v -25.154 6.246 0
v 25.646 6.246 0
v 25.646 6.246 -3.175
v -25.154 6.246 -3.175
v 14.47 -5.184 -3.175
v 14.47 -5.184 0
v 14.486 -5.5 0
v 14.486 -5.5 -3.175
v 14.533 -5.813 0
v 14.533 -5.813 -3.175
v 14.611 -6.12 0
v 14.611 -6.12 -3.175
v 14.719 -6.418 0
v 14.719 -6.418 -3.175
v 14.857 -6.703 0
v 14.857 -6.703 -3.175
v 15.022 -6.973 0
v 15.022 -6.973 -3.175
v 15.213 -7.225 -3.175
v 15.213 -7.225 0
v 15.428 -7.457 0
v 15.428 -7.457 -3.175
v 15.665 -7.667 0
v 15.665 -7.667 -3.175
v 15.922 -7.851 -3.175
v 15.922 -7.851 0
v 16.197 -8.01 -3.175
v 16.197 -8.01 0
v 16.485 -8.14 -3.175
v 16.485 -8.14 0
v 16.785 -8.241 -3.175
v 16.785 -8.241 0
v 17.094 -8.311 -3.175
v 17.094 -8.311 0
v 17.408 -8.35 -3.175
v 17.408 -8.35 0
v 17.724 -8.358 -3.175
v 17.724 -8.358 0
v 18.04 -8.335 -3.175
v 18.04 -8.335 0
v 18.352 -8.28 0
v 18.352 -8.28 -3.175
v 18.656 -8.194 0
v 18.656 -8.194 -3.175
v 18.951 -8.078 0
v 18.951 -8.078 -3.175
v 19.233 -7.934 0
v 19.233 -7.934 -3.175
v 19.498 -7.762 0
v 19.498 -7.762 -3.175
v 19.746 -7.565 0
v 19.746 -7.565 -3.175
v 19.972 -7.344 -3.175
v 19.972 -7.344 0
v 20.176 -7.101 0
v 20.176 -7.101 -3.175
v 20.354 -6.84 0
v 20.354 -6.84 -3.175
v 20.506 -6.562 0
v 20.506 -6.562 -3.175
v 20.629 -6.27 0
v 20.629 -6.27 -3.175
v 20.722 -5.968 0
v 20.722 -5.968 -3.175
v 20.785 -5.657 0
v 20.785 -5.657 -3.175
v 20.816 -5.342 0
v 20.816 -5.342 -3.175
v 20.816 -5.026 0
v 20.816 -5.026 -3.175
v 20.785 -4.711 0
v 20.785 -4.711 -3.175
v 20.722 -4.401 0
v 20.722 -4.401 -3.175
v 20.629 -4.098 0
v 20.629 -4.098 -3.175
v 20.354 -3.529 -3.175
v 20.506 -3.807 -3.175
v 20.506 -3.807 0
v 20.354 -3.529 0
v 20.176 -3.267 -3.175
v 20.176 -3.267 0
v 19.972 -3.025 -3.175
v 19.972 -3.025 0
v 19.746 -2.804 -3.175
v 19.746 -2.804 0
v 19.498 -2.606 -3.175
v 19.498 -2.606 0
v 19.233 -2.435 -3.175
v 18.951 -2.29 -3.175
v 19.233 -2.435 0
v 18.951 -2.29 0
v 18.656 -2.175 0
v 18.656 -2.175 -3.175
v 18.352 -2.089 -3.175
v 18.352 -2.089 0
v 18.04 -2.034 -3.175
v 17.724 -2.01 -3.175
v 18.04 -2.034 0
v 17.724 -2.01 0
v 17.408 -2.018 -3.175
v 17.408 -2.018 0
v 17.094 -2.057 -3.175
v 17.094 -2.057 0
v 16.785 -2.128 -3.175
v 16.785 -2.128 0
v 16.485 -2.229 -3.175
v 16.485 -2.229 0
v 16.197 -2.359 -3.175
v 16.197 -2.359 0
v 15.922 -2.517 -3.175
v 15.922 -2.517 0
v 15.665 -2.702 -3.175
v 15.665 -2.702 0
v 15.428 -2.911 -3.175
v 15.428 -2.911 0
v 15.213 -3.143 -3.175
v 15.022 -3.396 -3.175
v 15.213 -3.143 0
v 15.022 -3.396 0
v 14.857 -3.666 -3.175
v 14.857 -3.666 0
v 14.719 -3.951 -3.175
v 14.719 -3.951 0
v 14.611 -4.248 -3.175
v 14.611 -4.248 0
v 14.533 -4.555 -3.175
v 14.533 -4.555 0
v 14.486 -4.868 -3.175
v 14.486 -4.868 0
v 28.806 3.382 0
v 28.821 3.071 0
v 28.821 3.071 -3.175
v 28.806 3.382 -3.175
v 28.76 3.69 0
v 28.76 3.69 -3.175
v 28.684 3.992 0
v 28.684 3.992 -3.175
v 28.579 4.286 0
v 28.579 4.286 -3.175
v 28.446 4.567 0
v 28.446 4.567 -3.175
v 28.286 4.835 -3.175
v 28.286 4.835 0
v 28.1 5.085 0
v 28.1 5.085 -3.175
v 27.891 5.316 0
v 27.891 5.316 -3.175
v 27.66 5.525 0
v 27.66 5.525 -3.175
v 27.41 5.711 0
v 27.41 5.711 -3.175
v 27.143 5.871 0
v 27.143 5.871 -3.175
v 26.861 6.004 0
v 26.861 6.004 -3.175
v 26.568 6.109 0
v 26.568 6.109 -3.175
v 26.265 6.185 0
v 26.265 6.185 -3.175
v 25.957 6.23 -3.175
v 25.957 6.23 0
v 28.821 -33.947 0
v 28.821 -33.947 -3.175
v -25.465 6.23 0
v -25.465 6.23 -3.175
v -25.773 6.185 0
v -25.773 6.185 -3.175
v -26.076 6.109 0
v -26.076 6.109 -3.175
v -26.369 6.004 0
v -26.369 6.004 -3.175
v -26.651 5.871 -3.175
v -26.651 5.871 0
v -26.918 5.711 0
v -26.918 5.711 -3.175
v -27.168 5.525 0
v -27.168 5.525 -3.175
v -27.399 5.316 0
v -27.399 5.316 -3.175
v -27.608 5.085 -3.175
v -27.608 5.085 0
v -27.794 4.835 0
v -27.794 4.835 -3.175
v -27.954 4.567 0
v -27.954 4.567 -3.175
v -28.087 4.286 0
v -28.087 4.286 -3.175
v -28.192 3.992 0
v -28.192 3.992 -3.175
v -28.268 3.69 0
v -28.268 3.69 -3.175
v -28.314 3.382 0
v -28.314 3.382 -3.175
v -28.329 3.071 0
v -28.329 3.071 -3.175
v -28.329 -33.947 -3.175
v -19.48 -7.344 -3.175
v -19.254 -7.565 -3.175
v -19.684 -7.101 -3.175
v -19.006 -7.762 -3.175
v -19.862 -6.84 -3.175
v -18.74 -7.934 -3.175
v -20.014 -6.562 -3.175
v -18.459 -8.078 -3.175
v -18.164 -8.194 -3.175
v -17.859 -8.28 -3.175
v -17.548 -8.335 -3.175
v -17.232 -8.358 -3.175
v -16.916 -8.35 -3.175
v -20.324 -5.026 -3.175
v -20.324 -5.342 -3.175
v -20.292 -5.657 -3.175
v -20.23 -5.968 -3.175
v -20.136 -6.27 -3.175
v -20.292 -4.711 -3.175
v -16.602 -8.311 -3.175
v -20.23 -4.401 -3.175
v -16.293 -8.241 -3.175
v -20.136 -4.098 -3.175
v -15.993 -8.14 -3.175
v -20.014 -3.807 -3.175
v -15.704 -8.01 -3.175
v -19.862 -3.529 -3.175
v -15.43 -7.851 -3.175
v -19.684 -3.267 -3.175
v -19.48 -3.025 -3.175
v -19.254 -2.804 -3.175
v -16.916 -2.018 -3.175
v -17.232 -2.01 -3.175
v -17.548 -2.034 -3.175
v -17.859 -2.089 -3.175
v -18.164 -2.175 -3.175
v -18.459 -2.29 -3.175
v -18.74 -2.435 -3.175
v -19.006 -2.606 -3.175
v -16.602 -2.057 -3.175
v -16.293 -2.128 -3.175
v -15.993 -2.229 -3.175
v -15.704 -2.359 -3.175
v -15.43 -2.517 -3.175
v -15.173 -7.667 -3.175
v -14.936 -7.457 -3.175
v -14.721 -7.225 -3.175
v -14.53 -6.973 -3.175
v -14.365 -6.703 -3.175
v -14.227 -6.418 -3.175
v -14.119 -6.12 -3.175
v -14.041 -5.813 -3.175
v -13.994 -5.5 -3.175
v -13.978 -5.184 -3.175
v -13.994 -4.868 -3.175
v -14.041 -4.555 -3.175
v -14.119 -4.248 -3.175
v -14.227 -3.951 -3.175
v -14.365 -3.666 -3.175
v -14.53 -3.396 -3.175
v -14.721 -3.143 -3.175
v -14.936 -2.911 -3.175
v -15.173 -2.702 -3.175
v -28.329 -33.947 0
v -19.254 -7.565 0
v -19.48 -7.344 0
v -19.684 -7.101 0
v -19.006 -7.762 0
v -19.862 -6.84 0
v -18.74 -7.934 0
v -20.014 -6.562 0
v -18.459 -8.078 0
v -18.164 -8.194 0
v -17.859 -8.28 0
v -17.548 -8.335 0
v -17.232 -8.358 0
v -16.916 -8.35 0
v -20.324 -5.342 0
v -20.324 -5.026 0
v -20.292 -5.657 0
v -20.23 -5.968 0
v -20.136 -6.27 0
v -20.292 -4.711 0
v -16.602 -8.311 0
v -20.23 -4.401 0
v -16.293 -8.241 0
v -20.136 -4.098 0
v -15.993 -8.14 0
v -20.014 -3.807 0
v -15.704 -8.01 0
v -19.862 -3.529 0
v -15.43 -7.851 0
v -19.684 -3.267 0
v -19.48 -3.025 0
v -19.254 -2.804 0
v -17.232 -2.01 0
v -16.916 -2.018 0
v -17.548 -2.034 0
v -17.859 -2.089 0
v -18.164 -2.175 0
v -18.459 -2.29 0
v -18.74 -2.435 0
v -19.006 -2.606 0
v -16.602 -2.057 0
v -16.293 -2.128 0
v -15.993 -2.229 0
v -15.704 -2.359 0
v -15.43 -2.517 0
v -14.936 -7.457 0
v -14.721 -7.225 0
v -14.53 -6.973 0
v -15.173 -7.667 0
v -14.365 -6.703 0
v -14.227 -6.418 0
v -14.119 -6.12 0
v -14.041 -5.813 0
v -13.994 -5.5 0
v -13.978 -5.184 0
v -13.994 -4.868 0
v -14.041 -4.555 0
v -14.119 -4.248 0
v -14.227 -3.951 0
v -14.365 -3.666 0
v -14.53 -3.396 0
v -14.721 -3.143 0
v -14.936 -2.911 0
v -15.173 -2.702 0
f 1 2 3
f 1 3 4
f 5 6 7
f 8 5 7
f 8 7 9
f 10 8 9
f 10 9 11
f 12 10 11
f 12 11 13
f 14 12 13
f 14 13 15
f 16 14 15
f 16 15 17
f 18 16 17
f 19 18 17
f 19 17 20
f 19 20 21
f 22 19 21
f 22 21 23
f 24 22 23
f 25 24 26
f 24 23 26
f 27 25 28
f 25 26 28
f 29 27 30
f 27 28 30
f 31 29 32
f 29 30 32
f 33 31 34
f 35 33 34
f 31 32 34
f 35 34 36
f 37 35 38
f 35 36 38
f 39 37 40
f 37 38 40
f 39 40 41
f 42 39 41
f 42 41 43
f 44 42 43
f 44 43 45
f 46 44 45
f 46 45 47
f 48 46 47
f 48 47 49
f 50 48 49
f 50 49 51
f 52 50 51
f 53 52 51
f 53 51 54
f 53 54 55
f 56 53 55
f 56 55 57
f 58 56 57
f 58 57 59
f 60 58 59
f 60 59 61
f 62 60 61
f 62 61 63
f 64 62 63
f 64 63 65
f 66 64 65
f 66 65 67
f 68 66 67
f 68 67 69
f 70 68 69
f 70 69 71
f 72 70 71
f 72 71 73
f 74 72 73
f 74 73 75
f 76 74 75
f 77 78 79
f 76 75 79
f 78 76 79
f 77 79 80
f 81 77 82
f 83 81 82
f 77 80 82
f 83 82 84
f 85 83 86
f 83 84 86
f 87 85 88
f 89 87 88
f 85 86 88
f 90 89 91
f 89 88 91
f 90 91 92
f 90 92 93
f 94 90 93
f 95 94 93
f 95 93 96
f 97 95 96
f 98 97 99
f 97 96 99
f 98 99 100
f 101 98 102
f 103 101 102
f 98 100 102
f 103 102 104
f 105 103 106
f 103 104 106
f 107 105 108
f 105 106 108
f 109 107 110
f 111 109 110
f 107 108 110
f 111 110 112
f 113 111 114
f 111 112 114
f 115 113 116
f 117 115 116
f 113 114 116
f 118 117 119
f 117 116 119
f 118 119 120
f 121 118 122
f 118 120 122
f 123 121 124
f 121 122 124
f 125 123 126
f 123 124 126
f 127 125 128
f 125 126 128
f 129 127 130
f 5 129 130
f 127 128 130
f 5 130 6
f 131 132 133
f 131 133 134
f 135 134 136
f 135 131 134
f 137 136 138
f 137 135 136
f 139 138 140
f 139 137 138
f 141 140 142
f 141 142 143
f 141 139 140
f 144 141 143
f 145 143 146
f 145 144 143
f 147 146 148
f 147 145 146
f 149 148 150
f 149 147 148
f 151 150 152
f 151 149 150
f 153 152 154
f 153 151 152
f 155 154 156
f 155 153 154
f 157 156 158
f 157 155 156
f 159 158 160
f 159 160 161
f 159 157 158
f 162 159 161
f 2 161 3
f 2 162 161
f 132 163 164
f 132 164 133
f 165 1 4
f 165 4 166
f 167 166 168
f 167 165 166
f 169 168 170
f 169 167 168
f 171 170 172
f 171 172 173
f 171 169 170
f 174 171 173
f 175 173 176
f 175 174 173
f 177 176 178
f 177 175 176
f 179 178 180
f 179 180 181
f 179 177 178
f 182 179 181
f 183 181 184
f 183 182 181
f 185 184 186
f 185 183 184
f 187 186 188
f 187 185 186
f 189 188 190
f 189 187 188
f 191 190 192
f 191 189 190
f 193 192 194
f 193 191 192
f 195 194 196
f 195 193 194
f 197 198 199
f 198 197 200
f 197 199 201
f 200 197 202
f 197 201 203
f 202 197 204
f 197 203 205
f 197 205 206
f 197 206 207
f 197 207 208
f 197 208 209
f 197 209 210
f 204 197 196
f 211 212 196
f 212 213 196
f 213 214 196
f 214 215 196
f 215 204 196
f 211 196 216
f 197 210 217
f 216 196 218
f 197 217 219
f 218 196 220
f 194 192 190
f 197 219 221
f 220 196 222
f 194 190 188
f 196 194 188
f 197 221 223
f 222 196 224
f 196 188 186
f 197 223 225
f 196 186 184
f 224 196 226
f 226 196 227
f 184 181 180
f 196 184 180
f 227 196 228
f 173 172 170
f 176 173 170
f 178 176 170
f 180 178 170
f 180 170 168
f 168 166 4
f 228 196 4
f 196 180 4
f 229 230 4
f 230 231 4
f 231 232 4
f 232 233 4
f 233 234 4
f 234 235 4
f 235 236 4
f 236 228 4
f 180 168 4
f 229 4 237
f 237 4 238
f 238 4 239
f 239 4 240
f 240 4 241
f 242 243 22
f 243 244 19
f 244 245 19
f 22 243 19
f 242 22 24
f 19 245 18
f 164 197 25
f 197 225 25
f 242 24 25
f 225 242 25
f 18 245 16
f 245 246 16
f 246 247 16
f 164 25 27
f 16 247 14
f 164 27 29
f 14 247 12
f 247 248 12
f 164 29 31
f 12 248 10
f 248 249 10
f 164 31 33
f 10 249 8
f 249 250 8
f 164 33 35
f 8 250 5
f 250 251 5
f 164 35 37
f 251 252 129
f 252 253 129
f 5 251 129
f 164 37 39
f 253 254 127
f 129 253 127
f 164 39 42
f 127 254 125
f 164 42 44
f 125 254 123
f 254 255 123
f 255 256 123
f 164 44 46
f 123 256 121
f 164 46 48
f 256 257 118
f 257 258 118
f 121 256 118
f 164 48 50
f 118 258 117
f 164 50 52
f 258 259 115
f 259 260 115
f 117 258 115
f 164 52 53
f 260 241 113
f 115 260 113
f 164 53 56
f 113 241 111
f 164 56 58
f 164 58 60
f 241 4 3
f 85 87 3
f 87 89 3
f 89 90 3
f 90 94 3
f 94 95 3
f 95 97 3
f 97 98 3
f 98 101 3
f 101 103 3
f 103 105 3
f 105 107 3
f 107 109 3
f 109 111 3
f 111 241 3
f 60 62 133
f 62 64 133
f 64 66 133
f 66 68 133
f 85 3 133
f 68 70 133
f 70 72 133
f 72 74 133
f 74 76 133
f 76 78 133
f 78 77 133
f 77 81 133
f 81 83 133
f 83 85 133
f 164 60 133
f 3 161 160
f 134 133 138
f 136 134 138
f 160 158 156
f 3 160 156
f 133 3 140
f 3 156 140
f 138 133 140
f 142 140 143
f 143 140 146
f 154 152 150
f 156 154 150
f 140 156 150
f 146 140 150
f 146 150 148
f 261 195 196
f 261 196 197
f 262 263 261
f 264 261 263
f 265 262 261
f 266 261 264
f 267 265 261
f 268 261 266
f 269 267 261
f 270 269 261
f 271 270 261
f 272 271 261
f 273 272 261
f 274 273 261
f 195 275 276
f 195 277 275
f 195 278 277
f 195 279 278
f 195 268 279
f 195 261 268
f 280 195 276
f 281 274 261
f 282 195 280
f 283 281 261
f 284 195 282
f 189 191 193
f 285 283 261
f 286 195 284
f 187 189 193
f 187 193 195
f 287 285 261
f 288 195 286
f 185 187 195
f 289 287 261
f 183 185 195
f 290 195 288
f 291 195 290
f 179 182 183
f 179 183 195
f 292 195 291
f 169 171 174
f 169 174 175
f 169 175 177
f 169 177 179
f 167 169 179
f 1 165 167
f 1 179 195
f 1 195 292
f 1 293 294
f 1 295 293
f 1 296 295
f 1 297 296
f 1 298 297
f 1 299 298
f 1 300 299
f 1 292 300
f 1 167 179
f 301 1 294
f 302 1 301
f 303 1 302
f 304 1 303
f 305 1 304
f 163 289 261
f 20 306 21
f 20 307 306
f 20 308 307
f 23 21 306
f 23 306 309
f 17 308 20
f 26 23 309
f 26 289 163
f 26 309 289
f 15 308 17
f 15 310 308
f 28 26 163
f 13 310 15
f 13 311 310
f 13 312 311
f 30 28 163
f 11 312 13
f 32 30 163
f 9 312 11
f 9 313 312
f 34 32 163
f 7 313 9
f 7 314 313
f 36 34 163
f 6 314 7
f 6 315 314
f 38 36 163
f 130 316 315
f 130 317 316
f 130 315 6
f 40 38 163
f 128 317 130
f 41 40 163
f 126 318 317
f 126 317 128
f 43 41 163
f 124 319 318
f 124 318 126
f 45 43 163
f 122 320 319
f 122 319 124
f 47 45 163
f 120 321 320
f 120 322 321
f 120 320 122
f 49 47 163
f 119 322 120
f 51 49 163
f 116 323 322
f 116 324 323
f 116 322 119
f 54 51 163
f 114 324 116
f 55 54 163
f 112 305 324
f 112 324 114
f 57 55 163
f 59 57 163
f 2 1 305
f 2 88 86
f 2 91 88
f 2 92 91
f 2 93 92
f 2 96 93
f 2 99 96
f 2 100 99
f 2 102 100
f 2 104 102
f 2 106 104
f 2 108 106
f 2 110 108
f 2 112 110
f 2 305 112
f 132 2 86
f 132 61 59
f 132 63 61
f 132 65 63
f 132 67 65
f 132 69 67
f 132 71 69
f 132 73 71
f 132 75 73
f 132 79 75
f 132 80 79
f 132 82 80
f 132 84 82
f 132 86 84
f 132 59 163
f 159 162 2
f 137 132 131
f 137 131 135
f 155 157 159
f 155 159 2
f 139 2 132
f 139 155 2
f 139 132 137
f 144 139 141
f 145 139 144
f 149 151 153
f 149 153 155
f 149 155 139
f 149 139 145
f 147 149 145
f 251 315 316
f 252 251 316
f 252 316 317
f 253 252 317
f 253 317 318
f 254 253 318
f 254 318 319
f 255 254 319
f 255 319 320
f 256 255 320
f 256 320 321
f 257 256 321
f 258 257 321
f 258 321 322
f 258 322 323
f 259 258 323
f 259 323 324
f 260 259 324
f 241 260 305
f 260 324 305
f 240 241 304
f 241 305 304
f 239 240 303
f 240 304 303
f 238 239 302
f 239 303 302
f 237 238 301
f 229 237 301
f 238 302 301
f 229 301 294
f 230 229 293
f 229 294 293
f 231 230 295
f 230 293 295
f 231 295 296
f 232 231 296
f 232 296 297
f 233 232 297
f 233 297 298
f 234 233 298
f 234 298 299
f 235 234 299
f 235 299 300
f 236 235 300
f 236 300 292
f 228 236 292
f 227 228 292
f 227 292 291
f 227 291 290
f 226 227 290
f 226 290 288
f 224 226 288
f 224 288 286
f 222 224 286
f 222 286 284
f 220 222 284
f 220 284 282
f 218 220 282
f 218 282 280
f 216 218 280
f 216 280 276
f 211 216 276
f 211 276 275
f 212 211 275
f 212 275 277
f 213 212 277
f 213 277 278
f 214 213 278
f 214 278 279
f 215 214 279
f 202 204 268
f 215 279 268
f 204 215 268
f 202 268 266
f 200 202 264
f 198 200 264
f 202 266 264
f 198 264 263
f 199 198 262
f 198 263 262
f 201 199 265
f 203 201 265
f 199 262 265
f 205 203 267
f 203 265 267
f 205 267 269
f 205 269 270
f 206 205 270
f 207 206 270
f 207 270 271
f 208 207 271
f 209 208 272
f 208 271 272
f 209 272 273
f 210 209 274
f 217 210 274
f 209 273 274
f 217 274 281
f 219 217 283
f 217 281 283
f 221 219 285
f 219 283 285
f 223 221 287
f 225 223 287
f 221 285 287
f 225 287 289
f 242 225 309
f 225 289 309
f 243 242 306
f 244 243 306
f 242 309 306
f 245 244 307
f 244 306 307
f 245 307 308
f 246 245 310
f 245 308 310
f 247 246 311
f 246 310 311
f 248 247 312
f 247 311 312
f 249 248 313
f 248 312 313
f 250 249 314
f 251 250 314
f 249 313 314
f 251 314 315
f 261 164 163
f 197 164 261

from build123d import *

# Parameters (mm, degrees)
BOSS_EXTRUDE1_DEPTH = 3.175
SKETCH2_R           = 3.175
CUT_EXTRUDE1_DEPTH  = 67.929307933
SKETCH3_W           = 57.15
SKETCH3_H           = 29.175717927
CUT_EXTRUDE2_DEPTH  = 5.08


with BuildPart() as part:
    # Sketch1 → Boss-Extrude1 (new body)
    with BuildSketch(Plane.XY):
        with BuildLine():
            Line((-28.328951223, 3.070773738), (-28.328951223, -34.922456704))
            Line((-28.328951223, -34.922456704), (-28.328951223, -57.147456704))
            ThreePointArc((-28.328951223, -57.147456704), (-27.399015253, -59.392520734), (-25.153951223, -60.322456704))
            Line((-25.153951223, -60.322456704), (25.646048777, -60.322456704))
            ThreePointArc((25.646048777, -60.322456704), (27.891112807, -59.392520734), (28.821048777, -57.147456704))
            Line((28.821048777, -57.147456704), (28.821048777, -34.922456704))
            Line((28.821048777, -34.922456704), (28.821048777, 3.070773738))
            ThreePointArc((28.821048777, 3.070773738), (27.891112807, 5.315837768), (25.646048777, 6.245773738))
            Line((25.646048777, 6.245773738), (-25.153951223, 6.245773738))
            ThreePointArc((-25.153951223, 6.245773738), (-27.399015253, 5.315837768), (-28.328951223, 3.070773738))
        make_face()
    extrude(amount=-BOSS_EXTRUDE1_DEPTH)

    # Sketch2 → Cut-Extrude1 (cut, through all)
    with BuildSketch(Plane.XY):
        with Locations((-17.152951223, -5.184226262)):
            Circle(SKETCH2_R)
        with Locations(Location((17.645048777, -5.184226262, 0), (0, 0, 180))):
            Circle(SKETCH2_R)
    extrude(amount=-CUT_EXTRUDE1_DEPTH, mode=Mode.SUBTRACT)

    # Sketch3 → Cut-Extrude2 (cut)
    with BuildSketch(Plane(origin=(0, 0, -3.175), x_dir=(-1, 0, 0), z_dir=(0, 0, -1))):
        with Locations((-0.246048777, -48.534555274)):
            Rectangle(SKETCH3_W, SKETCH3_H)
    extrude(amount=-CUT_EXTRUDE2_DEPTH, mode=Mode.SUBTRACT)


solid = part.part
